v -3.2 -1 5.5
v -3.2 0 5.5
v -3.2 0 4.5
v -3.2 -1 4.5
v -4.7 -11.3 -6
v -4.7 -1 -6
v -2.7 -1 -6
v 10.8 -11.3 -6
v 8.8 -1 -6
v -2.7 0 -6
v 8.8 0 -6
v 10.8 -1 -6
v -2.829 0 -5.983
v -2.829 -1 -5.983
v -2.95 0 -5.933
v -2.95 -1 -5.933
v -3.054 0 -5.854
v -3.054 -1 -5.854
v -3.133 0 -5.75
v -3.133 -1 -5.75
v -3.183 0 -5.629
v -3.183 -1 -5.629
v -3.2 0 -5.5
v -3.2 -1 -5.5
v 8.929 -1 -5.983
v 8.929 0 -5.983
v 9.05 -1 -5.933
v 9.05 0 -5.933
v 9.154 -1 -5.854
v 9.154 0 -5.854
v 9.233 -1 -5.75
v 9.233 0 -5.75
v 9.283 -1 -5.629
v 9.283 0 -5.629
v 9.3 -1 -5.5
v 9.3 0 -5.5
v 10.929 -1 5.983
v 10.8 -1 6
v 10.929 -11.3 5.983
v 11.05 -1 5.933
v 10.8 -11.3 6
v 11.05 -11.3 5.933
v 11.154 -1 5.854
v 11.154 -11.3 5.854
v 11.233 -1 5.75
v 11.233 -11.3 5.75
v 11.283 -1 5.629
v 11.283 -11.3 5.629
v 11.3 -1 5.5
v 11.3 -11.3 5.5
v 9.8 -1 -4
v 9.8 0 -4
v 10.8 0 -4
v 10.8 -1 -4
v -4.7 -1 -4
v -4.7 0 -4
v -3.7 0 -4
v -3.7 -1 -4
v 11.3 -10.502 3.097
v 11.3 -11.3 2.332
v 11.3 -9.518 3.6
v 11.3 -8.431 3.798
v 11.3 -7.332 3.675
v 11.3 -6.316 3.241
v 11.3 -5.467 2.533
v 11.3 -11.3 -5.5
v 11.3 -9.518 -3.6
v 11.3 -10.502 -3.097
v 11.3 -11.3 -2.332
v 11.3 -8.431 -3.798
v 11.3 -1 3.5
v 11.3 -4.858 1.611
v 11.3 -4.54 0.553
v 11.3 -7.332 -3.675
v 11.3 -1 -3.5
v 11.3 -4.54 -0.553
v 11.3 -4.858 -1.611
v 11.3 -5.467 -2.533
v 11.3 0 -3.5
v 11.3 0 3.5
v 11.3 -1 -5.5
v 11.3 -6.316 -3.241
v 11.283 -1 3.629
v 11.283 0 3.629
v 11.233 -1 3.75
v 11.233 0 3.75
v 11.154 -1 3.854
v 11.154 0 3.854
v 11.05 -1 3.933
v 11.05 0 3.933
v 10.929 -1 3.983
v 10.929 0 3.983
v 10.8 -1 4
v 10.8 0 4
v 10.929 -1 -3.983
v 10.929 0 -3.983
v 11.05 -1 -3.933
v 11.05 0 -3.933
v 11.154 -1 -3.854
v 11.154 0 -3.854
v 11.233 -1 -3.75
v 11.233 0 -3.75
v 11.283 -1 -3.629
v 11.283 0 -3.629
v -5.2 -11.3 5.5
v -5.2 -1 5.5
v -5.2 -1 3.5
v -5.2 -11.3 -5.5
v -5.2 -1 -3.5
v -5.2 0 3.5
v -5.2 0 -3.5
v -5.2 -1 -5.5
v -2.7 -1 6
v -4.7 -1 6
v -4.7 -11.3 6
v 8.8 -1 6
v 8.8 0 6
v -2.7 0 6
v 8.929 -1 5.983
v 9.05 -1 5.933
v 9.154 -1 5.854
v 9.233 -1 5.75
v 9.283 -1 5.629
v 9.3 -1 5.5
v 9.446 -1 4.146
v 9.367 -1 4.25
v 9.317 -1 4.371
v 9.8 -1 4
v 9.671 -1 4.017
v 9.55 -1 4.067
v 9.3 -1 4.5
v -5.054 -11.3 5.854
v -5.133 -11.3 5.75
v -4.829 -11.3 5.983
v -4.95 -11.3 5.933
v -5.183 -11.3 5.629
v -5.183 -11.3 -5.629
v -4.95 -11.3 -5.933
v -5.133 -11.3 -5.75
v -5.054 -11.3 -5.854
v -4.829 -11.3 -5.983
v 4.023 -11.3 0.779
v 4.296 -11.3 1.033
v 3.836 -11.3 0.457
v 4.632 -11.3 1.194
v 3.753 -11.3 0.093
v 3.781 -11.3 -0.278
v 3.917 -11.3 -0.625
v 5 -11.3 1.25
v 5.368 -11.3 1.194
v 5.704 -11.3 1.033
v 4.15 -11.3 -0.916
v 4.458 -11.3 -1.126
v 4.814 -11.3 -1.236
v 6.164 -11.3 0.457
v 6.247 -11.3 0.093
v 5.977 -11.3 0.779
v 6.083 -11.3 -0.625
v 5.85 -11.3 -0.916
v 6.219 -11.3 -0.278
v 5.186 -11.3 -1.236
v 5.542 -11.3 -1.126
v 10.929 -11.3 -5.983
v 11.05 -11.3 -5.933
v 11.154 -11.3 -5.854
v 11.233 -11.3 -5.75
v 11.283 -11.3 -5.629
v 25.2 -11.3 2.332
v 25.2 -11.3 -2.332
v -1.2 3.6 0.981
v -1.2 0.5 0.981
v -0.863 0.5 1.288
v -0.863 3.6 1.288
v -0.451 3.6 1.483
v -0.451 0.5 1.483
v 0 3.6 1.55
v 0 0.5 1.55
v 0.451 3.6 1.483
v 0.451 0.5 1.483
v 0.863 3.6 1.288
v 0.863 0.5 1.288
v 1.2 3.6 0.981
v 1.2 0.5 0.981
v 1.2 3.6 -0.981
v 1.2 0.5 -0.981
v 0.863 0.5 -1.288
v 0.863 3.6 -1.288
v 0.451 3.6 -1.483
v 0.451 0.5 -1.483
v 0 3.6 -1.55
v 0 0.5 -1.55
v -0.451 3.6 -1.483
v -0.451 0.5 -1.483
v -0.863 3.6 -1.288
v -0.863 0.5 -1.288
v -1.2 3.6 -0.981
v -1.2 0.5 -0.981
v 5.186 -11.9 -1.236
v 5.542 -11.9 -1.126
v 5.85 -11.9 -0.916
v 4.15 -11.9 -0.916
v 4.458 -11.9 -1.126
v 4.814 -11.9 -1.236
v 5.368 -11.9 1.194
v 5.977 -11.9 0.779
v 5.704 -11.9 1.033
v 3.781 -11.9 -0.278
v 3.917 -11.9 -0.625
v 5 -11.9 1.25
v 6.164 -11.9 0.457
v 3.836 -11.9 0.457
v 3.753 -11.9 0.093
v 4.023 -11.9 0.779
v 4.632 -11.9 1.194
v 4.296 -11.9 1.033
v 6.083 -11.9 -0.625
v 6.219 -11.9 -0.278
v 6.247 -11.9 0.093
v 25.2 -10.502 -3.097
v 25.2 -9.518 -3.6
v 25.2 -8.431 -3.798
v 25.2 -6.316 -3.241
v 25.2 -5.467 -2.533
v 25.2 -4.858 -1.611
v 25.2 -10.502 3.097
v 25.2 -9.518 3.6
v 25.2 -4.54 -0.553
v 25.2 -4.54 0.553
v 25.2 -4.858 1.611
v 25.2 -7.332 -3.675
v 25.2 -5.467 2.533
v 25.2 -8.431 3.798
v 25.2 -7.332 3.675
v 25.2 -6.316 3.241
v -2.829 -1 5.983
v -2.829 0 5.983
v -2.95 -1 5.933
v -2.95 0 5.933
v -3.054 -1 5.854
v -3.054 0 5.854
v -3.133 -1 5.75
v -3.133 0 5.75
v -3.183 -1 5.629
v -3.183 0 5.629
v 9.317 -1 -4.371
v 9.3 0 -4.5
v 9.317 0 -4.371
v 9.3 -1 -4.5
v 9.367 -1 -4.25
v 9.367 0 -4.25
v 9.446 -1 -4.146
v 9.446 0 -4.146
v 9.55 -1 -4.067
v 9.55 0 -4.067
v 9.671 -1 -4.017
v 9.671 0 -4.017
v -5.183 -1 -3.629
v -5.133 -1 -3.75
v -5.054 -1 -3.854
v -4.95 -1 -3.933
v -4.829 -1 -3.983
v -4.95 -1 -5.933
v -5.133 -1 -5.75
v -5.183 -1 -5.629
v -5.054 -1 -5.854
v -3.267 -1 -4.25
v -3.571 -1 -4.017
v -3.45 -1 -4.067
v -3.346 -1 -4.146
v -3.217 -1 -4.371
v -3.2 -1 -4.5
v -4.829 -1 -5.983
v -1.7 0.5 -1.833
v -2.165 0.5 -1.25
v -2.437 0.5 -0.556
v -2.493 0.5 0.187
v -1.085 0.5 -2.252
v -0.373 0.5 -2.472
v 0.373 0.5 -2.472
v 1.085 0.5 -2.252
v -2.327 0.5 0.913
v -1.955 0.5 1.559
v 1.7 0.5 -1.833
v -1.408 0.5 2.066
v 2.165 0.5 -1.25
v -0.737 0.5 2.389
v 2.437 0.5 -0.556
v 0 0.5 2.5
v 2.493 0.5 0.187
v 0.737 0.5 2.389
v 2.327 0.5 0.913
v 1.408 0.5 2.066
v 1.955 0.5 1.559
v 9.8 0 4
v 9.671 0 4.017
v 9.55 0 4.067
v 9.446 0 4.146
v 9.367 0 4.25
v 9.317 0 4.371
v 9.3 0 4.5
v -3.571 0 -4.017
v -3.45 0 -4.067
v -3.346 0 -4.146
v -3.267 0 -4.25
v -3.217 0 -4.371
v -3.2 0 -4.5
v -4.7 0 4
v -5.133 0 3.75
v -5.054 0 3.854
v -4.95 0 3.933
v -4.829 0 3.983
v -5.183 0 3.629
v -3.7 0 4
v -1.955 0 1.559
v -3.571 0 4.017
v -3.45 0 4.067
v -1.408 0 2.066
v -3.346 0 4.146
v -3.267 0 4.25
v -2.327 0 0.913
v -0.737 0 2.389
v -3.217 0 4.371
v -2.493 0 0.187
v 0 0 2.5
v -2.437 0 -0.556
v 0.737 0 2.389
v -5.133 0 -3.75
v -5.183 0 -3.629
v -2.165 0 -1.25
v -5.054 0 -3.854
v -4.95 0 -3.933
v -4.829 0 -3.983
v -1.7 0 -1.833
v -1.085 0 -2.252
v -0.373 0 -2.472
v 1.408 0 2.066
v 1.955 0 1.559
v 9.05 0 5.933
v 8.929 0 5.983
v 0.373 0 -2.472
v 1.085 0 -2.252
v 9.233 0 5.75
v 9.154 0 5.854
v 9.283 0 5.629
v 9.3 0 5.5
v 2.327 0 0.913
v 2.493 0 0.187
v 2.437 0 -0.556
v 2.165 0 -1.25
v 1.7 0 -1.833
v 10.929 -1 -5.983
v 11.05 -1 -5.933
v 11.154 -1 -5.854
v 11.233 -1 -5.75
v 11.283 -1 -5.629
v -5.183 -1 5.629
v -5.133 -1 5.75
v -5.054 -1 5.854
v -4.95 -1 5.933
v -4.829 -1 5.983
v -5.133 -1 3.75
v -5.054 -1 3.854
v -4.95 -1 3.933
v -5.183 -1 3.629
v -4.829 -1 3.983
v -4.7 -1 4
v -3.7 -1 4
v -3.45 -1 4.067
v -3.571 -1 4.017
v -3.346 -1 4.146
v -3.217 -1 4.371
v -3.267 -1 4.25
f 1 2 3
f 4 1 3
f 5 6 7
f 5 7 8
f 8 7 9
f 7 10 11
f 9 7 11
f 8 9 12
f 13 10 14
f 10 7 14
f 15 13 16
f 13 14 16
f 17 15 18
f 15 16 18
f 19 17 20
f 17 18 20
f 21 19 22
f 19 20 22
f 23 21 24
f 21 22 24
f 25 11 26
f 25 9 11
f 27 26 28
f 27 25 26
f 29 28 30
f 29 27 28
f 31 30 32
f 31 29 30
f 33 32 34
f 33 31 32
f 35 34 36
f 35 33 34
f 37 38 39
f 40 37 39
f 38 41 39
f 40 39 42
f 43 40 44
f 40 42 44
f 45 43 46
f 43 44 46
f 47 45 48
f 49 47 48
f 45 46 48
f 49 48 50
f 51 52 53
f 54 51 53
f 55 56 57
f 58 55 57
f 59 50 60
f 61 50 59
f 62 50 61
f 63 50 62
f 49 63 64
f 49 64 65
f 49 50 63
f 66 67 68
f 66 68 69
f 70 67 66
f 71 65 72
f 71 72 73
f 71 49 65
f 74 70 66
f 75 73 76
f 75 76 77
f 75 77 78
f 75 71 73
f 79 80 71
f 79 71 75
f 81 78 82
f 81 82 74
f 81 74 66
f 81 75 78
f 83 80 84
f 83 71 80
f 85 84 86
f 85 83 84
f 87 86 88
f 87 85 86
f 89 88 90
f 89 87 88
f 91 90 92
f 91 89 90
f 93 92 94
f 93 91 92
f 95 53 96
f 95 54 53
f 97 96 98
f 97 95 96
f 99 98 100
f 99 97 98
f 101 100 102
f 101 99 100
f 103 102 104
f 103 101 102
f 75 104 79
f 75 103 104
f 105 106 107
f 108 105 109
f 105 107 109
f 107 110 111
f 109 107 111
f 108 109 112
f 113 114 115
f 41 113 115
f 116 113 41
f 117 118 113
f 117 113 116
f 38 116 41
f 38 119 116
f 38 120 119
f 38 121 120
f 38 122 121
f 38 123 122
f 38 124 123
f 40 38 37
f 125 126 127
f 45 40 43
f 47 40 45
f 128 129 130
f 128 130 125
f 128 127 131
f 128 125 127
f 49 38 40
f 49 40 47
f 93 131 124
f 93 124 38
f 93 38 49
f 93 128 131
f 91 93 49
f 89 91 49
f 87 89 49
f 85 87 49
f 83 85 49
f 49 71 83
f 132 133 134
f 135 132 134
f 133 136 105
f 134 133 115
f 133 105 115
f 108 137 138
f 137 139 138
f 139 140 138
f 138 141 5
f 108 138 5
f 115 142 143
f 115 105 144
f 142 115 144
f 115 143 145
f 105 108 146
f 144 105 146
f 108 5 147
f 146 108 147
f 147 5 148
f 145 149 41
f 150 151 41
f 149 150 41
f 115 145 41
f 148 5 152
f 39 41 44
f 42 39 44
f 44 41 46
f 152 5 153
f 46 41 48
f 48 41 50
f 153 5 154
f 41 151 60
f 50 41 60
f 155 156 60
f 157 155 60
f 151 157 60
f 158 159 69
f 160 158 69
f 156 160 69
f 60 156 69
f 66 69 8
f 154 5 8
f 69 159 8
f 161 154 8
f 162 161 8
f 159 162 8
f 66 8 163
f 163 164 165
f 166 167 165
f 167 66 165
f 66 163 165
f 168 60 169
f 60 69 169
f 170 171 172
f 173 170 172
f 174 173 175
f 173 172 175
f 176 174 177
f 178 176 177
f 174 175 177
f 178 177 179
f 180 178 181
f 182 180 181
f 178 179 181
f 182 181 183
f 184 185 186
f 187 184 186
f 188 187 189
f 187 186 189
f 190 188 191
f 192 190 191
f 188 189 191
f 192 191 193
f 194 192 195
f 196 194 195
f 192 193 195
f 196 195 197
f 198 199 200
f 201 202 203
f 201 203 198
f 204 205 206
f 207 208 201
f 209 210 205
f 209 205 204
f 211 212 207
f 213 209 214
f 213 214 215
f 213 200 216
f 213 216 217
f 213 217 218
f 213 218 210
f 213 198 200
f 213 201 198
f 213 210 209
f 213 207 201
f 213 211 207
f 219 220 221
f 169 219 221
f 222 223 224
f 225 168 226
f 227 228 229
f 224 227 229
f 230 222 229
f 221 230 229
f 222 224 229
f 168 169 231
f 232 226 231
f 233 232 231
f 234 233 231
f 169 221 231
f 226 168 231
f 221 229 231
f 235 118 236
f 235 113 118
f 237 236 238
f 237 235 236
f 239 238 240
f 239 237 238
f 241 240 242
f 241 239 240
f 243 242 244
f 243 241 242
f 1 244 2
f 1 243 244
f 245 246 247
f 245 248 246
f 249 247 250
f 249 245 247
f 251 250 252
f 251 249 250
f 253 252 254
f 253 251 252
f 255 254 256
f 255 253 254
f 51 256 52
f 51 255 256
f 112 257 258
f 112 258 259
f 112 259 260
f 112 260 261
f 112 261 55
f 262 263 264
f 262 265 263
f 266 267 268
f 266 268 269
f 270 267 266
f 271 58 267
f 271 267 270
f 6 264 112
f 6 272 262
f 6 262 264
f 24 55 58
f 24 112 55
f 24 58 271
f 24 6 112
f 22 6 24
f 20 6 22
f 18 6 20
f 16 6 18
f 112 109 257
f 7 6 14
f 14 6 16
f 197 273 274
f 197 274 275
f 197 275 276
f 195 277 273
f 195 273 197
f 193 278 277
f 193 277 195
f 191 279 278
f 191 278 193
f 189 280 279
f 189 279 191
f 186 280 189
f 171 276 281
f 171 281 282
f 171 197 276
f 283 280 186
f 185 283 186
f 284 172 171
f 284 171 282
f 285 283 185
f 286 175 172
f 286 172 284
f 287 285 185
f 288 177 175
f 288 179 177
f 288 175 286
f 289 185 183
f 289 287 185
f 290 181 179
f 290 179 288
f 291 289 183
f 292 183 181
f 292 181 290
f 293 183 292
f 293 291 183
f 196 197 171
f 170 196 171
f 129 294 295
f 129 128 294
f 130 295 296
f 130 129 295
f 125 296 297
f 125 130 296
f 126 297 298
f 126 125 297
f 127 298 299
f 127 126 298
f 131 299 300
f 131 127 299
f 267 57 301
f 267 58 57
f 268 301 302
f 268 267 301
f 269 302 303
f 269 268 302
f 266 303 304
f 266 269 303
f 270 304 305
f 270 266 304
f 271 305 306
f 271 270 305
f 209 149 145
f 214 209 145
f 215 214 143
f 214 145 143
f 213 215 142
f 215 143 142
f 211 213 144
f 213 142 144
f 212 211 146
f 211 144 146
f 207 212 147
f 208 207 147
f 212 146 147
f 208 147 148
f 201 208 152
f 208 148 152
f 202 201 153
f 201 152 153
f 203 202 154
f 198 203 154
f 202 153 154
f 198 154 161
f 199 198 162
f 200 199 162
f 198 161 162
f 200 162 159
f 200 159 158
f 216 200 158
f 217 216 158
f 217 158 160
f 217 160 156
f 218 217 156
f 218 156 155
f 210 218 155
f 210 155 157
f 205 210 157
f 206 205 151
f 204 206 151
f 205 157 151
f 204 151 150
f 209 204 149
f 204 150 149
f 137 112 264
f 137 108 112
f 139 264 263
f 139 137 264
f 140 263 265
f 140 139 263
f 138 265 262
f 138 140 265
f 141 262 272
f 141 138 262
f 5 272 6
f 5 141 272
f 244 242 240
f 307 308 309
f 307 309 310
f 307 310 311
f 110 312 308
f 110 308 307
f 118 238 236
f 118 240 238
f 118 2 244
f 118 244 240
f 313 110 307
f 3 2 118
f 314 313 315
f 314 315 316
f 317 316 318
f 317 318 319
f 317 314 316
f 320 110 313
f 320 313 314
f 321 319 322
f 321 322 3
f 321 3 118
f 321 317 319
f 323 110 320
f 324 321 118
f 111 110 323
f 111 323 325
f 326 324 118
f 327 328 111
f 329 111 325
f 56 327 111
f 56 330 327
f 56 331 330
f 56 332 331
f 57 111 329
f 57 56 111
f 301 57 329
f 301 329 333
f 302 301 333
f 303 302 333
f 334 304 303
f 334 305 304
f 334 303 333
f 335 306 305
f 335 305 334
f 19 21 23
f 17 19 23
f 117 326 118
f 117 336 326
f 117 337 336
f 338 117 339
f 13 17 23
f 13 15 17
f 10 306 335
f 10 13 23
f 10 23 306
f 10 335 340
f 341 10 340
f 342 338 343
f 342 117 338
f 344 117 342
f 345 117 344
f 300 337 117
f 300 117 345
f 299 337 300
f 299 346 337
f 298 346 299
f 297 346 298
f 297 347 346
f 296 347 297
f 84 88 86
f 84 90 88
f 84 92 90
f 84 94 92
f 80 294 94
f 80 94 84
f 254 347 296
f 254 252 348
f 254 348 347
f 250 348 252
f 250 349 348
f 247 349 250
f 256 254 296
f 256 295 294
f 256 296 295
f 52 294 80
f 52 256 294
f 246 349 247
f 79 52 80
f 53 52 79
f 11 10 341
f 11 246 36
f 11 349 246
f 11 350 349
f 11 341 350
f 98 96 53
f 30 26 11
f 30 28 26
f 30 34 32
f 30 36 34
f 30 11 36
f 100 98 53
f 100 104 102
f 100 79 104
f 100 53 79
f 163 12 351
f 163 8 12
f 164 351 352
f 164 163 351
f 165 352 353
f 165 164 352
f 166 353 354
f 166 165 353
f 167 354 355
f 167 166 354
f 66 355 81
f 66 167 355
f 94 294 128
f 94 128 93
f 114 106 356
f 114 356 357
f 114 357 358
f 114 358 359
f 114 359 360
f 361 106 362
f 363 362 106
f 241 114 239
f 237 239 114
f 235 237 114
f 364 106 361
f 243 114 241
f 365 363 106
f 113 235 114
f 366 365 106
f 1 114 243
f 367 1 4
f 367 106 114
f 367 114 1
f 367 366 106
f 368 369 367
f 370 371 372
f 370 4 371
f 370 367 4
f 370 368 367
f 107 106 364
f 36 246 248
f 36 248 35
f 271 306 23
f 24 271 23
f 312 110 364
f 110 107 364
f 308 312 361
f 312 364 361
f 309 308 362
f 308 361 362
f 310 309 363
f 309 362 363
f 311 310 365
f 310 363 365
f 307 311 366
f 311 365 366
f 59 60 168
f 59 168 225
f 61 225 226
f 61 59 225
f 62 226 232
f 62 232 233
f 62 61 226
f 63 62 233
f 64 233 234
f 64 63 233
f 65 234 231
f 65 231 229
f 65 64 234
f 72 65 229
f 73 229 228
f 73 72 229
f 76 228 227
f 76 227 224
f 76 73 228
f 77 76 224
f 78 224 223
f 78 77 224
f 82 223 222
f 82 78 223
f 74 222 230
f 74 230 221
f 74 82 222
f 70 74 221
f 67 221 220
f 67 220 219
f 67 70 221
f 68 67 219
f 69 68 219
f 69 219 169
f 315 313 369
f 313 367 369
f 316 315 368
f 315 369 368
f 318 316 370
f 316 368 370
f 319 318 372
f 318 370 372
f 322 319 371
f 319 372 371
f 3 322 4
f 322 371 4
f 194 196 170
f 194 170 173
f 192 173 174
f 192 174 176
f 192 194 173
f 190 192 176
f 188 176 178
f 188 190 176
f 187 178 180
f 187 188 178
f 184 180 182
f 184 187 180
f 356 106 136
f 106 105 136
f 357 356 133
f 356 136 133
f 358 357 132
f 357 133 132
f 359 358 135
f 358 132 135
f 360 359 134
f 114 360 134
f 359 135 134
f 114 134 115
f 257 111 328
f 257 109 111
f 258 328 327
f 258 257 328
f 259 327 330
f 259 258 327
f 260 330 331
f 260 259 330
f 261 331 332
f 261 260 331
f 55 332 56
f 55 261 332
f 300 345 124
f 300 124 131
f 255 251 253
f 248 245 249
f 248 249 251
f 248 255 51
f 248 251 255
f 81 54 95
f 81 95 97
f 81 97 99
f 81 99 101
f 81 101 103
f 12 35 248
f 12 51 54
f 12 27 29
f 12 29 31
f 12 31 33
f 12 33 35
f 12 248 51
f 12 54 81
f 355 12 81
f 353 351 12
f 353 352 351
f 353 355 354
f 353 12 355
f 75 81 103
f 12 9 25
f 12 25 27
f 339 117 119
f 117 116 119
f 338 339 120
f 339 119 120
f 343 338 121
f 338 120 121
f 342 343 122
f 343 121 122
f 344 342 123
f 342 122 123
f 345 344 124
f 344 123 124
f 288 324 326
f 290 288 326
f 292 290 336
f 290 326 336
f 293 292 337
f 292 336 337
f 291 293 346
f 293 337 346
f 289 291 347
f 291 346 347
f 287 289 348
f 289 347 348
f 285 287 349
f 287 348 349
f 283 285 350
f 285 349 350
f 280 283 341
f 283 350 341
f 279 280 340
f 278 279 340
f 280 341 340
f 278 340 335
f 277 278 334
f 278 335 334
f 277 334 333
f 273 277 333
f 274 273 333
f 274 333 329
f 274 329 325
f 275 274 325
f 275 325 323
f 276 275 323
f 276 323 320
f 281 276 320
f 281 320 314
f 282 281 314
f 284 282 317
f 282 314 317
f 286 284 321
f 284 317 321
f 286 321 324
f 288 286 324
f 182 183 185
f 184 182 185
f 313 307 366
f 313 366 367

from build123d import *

# Parameters (mm, degrees)
SKETCH1_W           = 16.5
SKETCH1_H           = 12
GEARBOX_DEPTH       = 11.3
SKETCH2_R           = 2.5
SHAFTBASE_DEPTH     = 0.5
SHAFT_DEPTH         = 3.1
MOTOR_DEPTH         = 13.9
SKETCH5_W           = 2
SKETCH5_H           = 2
SCREWINSETS_DEPTH   = 1
SKETCH6_R           = 1.25
BACKEXTRUSION_DEPTH = 0.6
FILLETS_R           = 0.5


with BuildPart() as part:
    # Sketch1 → gearbox (new body)
    with BuildSketch(Plane(origin=(0, 0, 0), x_dir=(1, 0, 0), z_dir=(0, 1, 0))):
        with Locations((3.05, 0)):
            Rectangle(SKETCH1_W, SKETCH1_H)
    extrude(amount=-GEARBOX_DEPTH)

    # Sketch2 → shaftbase (add)
    with BuildSketch(Plane(origin=(0, 0, 0), x_dir=(1, 0, 0), z_dir=(0, 1, 0))):
        with Locations(Location((0, 0, 0), (0, 0, 270))):
            Circle(SKETCH2_R)
    extrude(amount=SHAFTBASE_DEPTH)

    # Sketch3 → shaft (add)
    with BuildSketch(Plane(origin=(0, 0.5, 0), x_dir=(1, 0, 0), z_dir=(0, 1, 0))):
        with BuildLine():
            Line((-1.2, 0.981070844), (-1.2, -0.981070844))
            ThreePointArc((-1.2, -0.981070844), (0, -1.55), (1.2, -0.981070844))
            Line((1.2, -0.981070844), (1.2, 0.981070844))
            ThreePointArc((1.2, 0.981070844), (0, 1.55), (-1.2, 0.981070844))
        make_face()
    extrude(amount=SHAFT_DEPTH)

    # Sketch4 → motor (add)
    with BuildSketch(Plane(origin=(11.3, 0, 0), x_dir=(0, 0, -1), z_dir=(1, 0, 0))):
        with BuildLine():
            Line((2.332380758, -11.3), (-2.332380758, -11.3))
            ThreePointArc((-2.332380758, -11.3), (0, -4.5), (2.332380758, -11.3))
        make_face()
    extrude(amount=MOTOR_DEPTH)

    # Sketch5 → screwinsets (cut)
    with BuildSketch(Plane(origin=(0, 0, 0), x_dir=(1, 0, 0), z_dir=(0, 1, 0))):
        with Locations((-4.2, 5)):
            Rectangle(SKETCH5_W, SKETCH5_H)
        with Locations((10.3, 5)):
            Rectangle(SKETCH5_W, SKETCH5_H)
        with Locations((10.3, -5)):
            Rectangle(SKETCH5_W, SKETCH5_H)
        with Locations((-4.2, -5)):
            Rectangle(SKETCH5_W, SKETCH5_H)
    extrude(amount=-SCREWINSETS_DEPTH, mode=Mode.SUBTRACT)

    # Sketch6 → backextrusion (add)
    with BuildSketch(Plane.XZ.offset(11.3)):
        with Locations(Location((5, 0, 0), (0, 0, 90))):
            Circle(SKETCH6_R)
    extrude(amount=BACKEXTRUSION_DEPTH)

    # fillets
    fillets_edges = [part.edges().sort_by_distance(p)[0] for p in [
        (-3.2, -0.5, -6),
        (-5.2, -0.5, -4),
        (-5.2, -0.5, 4),
        (-3.2, -0.5, 6),
        (9.3, -0.5, -6),
        (11.3, -0.5, -4),
        (11.3, -0.5, 4),
        (9.3, -0.5, 6),
        (-3.2, -0.5, -4),
        (9.3, -0.5, 4),
        (9.3, -0.5, -4),
        (-3.2, -0.5, 4),
        (-5.2, -6.15, -6),
        (-5.2, -6.15, 6),
        (11.3, -6.15, -6),
        (11.3, -6.15, 6),
    ]]
    fillet(fillets_edges, radius=FILLETS_R)


solid = part.part
